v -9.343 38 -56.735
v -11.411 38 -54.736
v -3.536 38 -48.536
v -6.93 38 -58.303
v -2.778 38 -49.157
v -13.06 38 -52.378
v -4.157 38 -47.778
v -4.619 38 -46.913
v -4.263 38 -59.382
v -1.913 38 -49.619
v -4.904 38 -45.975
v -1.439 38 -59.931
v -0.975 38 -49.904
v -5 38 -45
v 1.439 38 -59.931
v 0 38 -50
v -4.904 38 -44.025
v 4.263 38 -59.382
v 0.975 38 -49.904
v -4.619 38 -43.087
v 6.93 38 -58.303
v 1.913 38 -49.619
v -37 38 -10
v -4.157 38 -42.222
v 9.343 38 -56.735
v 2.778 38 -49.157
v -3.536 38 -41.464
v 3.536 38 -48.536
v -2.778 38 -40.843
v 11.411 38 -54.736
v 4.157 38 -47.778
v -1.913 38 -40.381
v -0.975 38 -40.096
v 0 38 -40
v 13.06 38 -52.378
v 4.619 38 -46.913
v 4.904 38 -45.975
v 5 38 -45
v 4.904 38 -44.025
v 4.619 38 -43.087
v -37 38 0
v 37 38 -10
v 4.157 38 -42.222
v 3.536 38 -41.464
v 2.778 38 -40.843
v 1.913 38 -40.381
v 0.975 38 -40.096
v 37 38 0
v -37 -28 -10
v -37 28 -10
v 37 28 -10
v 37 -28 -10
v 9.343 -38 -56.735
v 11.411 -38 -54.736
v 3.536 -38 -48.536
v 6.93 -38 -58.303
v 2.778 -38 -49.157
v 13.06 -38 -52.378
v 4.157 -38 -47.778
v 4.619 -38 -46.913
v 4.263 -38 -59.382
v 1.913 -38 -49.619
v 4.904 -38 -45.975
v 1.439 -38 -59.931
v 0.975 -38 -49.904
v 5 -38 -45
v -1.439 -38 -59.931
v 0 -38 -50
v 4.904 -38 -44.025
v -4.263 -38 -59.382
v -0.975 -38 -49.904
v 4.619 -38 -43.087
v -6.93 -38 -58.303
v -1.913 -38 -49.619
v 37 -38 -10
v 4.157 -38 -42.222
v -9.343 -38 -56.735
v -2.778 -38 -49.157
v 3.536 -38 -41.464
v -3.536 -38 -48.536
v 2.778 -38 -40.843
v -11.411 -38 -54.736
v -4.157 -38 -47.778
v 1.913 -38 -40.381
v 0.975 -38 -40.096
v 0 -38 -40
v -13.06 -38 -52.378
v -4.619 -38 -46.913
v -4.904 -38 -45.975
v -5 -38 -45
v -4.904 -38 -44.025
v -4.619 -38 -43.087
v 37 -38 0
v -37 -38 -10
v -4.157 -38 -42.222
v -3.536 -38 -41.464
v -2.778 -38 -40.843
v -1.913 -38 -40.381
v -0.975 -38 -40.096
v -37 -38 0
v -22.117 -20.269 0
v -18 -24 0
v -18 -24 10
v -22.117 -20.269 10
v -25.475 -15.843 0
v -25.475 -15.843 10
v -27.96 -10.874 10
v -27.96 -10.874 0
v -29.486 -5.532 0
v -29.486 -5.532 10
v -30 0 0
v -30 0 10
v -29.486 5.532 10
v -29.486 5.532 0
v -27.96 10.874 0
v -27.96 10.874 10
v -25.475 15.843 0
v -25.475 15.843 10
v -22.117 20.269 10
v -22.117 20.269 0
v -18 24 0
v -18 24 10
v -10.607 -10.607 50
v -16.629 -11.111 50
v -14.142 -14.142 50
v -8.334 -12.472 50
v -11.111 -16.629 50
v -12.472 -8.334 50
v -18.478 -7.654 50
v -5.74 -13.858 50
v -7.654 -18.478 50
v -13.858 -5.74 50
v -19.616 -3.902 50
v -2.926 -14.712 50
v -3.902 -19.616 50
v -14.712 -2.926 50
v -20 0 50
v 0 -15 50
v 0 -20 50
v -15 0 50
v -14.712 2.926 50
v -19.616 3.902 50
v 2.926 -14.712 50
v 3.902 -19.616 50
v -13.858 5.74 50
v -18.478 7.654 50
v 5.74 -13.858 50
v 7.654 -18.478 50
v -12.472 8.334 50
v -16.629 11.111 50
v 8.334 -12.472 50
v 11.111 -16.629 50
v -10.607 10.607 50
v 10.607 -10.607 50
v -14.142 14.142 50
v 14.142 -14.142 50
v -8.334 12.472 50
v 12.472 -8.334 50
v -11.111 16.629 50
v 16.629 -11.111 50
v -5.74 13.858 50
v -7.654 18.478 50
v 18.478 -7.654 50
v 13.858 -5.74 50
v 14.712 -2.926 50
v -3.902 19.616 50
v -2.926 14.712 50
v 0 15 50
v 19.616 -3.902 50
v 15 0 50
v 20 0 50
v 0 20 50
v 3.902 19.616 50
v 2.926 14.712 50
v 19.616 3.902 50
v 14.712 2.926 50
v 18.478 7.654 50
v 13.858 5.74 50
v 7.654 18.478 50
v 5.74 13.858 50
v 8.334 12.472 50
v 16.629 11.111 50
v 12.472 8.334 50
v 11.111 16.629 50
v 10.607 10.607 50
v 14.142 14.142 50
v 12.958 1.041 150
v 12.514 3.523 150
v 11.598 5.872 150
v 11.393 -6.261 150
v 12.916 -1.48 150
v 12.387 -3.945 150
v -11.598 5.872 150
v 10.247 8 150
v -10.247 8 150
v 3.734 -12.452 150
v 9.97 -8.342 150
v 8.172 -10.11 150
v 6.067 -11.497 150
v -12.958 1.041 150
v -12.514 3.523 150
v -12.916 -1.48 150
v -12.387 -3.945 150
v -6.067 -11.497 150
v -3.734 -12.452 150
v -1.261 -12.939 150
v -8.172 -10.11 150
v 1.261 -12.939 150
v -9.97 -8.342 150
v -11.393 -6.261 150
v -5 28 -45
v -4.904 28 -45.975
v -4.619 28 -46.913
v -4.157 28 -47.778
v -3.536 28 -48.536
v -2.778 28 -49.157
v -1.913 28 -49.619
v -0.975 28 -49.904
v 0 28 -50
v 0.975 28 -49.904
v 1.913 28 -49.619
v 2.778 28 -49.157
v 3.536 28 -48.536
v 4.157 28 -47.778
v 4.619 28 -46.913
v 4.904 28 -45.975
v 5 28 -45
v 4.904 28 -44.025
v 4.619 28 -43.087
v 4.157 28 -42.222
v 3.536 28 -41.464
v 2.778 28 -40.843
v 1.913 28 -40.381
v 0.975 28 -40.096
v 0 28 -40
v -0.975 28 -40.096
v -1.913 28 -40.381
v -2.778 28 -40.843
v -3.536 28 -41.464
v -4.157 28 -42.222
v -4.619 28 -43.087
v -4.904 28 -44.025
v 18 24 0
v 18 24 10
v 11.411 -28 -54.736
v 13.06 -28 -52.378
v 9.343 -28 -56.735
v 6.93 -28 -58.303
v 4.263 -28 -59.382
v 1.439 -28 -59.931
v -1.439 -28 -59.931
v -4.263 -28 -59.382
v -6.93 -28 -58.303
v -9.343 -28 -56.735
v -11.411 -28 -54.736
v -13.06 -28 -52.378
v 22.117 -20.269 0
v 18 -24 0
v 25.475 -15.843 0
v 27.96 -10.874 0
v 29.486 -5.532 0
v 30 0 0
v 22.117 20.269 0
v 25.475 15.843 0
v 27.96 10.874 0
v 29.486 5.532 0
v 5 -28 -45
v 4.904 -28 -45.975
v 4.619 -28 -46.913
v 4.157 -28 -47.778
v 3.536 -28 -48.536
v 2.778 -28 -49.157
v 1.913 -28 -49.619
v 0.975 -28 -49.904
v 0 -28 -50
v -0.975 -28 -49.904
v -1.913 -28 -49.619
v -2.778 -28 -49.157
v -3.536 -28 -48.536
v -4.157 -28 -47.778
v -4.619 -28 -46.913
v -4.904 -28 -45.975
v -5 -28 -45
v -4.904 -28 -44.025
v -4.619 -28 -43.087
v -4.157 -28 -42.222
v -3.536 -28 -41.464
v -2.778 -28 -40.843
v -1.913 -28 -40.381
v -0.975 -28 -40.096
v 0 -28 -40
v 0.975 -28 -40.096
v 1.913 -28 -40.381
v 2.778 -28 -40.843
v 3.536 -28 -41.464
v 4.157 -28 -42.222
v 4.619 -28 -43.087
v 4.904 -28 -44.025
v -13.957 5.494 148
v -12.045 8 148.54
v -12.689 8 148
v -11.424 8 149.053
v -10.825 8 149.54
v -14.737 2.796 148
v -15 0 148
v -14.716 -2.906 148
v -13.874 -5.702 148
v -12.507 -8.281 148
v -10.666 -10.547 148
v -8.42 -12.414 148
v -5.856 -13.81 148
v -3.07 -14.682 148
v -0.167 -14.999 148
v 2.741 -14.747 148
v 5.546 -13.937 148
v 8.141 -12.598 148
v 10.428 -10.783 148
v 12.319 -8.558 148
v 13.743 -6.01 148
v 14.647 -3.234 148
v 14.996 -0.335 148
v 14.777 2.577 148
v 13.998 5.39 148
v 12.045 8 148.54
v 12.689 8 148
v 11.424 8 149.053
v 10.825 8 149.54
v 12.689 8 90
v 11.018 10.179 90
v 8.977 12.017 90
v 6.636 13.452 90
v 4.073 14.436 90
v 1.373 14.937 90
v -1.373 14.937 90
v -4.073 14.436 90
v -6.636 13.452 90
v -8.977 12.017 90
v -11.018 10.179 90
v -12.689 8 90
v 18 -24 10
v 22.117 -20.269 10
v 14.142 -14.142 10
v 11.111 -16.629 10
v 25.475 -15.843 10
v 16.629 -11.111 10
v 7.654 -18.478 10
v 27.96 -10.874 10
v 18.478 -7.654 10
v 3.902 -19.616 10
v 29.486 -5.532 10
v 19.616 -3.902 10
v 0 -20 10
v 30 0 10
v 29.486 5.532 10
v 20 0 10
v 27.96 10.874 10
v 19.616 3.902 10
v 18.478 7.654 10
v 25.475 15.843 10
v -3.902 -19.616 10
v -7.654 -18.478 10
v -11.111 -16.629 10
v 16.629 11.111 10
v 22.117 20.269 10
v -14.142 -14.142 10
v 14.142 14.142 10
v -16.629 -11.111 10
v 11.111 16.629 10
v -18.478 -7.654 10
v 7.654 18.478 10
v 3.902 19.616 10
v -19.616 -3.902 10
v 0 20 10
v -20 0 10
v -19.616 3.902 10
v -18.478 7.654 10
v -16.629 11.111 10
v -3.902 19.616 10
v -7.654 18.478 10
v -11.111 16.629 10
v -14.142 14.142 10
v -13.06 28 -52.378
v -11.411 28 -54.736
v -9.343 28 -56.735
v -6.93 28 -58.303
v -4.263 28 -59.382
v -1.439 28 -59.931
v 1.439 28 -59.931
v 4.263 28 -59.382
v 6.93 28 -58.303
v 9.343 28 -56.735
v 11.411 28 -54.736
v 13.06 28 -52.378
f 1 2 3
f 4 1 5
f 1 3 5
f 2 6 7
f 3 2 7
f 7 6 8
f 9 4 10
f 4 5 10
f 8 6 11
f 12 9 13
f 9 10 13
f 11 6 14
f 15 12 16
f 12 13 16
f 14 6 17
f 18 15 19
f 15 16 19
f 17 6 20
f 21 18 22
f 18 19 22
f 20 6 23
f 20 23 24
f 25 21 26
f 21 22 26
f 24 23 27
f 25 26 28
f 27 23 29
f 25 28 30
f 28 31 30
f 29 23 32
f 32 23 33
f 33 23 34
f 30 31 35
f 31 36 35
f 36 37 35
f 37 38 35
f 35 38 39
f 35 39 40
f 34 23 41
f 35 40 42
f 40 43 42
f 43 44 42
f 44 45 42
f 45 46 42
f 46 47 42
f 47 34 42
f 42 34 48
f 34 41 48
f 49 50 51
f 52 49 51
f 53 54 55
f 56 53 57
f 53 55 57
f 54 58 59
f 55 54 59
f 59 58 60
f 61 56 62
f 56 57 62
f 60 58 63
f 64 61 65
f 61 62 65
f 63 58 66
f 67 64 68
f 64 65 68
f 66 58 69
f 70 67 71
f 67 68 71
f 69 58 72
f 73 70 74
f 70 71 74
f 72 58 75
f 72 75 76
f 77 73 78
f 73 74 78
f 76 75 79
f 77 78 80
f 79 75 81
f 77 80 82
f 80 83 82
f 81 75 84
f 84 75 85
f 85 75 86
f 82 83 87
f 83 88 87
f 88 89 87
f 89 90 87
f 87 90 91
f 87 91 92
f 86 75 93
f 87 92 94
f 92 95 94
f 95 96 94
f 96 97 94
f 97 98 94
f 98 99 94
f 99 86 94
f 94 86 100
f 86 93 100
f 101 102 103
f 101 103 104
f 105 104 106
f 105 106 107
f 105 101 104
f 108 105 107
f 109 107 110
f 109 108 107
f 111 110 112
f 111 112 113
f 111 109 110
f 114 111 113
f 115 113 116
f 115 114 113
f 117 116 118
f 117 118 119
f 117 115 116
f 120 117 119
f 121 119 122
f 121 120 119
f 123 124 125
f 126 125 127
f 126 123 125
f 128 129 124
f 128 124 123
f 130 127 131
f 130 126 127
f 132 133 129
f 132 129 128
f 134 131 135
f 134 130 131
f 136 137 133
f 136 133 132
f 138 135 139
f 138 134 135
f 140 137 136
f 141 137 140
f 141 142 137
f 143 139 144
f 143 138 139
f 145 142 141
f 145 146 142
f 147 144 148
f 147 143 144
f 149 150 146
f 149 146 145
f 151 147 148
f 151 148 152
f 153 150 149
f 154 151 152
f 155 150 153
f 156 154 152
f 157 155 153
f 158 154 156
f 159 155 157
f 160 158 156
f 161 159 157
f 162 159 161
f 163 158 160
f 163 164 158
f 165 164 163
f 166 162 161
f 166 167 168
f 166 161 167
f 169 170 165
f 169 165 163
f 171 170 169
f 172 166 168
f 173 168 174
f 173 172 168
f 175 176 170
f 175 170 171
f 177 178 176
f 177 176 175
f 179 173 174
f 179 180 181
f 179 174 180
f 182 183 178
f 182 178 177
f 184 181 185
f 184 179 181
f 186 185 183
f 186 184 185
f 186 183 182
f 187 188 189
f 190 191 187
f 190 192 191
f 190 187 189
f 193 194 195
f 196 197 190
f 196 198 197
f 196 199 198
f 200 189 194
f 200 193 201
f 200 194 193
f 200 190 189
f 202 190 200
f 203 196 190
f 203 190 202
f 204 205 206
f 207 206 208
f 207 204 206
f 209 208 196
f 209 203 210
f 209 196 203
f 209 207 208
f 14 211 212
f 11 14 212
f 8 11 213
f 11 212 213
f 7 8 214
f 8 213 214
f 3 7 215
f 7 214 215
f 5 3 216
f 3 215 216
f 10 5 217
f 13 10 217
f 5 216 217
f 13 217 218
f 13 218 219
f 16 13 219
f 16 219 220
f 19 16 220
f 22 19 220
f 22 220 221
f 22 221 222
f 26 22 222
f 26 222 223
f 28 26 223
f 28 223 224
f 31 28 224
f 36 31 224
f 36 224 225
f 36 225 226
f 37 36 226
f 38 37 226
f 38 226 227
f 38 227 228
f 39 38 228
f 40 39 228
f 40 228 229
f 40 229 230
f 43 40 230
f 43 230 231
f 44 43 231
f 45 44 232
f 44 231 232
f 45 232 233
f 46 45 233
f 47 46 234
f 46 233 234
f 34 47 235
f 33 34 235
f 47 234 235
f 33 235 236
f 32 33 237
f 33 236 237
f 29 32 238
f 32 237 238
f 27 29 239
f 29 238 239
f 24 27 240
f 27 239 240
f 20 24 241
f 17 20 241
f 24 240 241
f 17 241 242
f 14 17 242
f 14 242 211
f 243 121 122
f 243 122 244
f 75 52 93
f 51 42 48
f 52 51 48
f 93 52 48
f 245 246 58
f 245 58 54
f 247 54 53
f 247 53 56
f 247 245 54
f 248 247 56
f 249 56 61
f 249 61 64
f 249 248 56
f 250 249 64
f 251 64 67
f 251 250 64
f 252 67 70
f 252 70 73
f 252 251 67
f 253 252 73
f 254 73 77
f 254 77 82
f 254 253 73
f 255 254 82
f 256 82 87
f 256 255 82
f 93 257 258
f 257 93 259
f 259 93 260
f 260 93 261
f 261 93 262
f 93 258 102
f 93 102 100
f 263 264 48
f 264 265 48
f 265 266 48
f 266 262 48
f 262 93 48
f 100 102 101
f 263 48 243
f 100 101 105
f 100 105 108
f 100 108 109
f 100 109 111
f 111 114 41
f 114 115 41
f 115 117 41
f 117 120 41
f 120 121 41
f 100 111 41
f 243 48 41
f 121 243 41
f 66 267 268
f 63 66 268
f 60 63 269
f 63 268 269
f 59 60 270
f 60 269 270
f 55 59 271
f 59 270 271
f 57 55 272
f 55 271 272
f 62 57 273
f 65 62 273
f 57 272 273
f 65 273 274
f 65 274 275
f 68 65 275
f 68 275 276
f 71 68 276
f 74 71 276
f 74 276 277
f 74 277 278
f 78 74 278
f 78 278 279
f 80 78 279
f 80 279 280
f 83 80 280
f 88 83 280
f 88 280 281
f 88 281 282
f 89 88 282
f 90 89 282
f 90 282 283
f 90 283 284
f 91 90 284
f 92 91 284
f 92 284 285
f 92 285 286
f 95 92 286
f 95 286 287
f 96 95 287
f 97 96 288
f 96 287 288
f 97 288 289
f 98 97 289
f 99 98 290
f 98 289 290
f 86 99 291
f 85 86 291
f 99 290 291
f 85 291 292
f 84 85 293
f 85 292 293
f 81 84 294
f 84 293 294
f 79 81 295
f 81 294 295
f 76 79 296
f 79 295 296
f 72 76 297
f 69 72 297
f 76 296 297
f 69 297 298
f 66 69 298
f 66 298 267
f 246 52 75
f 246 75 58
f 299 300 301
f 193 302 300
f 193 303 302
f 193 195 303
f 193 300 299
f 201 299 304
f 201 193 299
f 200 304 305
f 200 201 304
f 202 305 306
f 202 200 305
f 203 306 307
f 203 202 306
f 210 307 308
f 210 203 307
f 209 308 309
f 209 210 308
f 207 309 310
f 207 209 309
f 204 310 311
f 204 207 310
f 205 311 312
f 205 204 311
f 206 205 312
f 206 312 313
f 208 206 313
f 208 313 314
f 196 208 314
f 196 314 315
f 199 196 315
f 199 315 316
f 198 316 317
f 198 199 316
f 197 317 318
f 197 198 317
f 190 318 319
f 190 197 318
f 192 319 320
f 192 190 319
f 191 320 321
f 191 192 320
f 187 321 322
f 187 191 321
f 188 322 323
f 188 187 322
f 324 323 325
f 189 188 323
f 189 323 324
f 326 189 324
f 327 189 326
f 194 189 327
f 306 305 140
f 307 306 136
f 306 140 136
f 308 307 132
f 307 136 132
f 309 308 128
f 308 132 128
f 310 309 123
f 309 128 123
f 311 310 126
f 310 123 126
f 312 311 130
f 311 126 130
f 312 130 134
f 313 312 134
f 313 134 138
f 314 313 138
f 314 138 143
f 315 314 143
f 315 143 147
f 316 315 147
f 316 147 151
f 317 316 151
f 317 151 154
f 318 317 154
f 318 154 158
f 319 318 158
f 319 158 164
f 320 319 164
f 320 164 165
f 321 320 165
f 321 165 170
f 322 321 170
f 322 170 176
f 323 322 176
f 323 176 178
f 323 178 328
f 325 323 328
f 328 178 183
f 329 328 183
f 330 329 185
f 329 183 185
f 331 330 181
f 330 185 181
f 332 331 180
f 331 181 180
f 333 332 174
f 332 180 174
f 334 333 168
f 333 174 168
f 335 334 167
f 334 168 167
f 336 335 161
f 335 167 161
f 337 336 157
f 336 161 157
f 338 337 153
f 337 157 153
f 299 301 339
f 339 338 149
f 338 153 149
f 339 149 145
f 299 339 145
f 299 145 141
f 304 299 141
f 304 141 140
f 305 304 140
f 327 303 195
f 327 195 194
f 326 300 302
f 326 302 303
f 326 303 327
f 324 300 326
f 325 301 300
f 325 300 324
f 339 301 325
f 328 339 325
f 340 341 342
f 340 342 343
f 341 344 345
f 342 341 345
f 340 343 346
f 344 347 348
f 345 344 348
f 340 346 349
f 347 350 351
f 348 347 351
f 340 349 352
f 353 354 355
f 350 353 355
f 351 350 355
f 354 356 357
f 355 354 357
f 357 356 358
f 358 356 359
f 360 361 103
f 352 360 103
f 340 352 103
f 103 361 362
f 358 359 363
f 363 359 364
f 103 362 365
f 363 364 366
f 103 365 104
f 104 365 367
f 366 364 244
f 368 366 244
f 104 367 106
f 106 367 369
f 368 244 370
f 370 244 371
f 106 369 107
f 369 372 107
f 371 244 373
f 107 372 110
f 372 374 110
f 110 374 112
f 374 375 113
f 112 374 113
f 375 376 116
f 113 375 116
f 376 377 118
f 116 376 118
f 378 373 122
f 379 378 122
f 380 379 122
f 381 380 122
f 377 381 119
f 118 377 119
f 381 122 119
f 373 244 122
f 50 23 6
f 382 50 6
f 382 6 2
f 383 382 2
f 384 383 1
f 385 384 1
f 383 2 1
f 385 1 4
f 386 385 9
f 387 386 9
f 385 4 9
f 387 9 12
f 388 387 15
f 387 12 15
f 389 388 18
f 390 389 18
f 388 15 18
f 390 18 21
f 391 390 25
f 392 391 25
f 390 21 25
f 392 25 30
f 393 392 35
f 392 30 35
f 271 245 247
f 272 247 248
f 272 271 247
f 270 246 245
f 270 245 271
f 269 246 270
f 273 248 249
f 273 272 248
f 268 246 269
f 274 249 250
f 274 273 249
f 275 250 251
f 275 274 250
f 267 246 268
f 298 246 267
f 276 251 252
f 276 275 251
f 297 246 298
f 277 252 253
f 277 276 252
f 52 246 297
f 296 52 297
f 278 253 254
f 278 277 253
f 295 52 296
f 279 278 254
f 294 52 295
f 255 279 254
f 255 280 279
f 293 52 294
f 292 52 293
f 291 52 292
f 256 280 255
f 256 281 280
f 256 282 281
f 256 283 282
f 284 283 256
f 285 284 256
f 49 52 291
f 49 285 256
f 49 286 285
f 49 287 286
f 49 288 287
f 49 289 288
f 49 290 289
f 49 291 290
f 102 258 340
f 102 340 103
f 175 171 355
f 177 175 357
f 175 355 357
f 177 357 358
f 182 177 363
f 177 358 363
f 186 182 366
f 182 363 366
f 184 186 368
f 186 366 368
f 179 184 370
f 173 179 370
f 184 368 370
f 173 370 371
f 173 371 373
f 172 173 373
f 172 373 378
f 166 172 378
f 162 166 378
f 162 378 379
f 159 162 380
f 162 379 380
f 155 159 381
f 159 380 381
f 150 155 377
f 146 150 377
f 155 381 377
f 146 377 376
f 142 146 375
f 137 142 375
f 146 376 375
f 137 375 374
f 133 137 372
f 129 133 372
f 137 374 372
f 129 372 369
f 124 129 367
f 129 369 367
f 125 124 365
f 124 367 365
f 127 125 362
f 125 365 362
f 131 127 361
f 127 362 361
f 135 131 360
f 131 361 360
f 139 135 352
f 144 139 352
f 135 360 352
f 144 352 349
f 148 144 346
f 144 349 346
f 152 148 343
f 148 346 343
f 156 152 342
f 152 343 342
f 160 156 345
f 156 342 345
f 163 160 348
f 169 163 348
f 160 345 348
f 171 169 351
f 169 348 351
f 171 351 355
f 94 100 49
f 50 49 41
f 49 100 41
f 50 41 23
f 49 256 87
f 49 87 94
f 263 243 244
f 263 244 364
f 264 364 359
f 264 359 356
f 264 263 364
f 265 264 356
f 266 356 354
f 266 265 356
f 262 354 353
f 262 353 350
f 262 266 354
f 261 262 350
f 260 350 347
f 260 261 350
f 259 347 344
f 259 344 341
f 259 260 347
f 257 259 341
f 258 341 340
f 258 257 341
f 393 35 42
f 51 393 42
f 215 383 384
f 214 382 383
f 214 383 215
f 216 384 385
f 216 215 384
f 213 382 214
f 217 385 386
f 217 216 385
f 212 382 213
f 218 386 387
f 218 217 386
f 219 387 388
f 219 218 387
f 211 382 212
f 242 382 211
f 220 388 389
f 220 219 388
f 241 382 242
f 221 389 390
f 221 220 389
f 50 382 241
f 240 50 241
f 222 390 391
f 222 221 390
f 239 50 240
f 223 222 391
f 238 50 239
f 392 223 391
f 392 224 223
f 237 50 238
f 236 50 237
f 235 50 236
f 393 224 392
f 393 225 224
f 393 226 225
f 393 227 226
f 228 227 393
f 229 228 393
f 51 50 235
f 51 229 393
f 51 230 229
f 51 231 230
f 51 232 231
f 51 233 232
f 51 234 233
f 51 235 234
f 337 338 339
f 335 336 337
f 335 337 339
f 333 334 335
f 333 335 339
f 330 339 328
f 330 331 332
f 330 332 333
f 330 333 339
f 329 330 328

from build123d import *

# Parameters (mm, degrees)
SKETCH1_W                      = 74
SKETCH1_H                      = 56
BOSS_EXTRUDE1_DEPTH            = 10
BOSS_EXTRUDE2_DEPTH            = 10
BOSS_EXTRUDE3_START            = 10
BOSS_EXTRUDE3_DEPTH            = 10
BOSS_EXTRUDE4_DEPTH            = 10
SKETCH5_R                      = 20
BOSS_EXTRUDE5_DEPTH            = 40
SKETCH6_R                      = 15
BOSS_EXTRUDE6_DEPTH            = 100
CUT_EXTRUDE1_START             = -60
CUT_EXTRUDE1_DEPTH             = 60
F_10_0_10_DIAMETER_HOLE1_D     = 10
F_10_0_10_DIAMETER_HOLE1_DEPTH = 10
F_10_0_10_DIAMETER_HOLE2_D     = 10
F_10_0_10_DIAMETER_HOLE2_DEPTH = 76
CHAMFER1_SIZE                  = 2


with BuildPart() as part:
    # Sketch1 → Boss-Extrude1 (new body)
    with BuildSketch(Plane.XY):
        Rectangle(SKETCH1_W, SKETCH1_H)
    extrude(amount=-BOSS_EXTRUDE1_DEPTH)

    # Sketch2 → Boss-Extrude2 (add)
    with BuildSketch(Plane.XZ.offset(28)):
        with BuildLine():
            Line((-37, 0), (37, 0))
            Line((37, 0), (37, -10))
            Line((37, -10), (13.060137394, -52.377859531))
            ThreePointArc((13.060137394, -52.377859531), (0, -60), (-13.060137394, -52.377859531))
            Line((-13.060137394, -52.377859531), (-37, -10))
            Line((-37, -10), (-37, 0))
        make_face()
    extrude(amount=BOSS_EXTRUDE2_DEPTH)

    # Sketch3 → Boss-Extrude3 (add)
    with BuildSketch(Plane(origin=(0, 28, 0), x_dir=(-1, 0, 0), z_dir=(0, 1, 0)).offset(BOSS_EXTRUDE3_START)):
        with BuildLine():
            Line((-37, 0), (37, 0))
            Line((37, 0), (37, -10))
            Line((37, -10), (13.060137394, -52.377859531))
            ThreePointArc((13.060137394, -52.377859531), (0, -60), (-13.060137394, -52.377859531))
            Line((-13.060137394, -52.377859531), (-37, -10))
            Line((-37, -10), (-37, 0))
        make_face()
    extrude(amount=-BOSS_EXTRUDE3_DEPTH)

    # Sketch4 → Boss-Extrude4 (add)
    with BuildSketch(Plane.XY):
        with BuildLine():
            Line((18, -24), (-18, -24))
            ThreePointArc((-18, -24), (-30, 0), (-18, 24))
            Line((-18, 24), (18, 24))
            ThreePointArc((18, 24), (30, 0), (18, -24))
        make_face()
    extrude(amount=BOSS_EXTRUDE4_DEPTH)

    # Sketch5 → Boss-Extrude5 (add)
    with BuildSketch(Plane.XY.offset(10)):
        Circle(SKETCH5_R)
    extrude(amount=BOSS_EXTRUDE5_DEPTH)

    # Sketch6 → Boss-Extrude6 (add)
    with BuildSketch(Plane.XY.offset(50)):
        with Locations(Location((0, 0, 0), (0, 0, 180))):
            Circle(SKETCH6_R)
    extrude(amount=BOSS_EXTRUDE6_DEPTH)

    # Sketch7 → Cut-Extrude1 (cut)
    with BuildSketch(Plane.XY.offset(150).offset(CUT_EXTRUDE1_START)):
        with BuildLine():
            Line((-12.68857754, 8), (12.68857754, 8))
            ThreePointArc((12.68857754, 8), (0, 15), (-12.68857754, 8))
        make_face()
    extrude(amount=CUT_EXTRUDE1_DEPTH, mode=Mode.SUBTRACT)

    # Ø10.0 (10) Diameter Hole1
    with Locations(Plane(origin=(0, -38, 0), x_dir=(-1, 0, 0), z_dir=(0, -1, 0))):
        with Locations((0, 45)):
            Hole(F_10_0_10_DIAMETER_HOLE1_D / 2, depth=F_10_0_10_DIAMETER_HOLE1_DEPTH)

    # Ø10.0 (10) Diameter Hole2
    with Locations(Plane(origin=(0, 38, 0), x_dir=(1, 0, 0), z_dir=(0, 1, 0))):
        with Locations((0, 45)):
            Hole(F_10_0_10_DIAMETER_HOLE2_D / 2, depth=F_10_0_10_DIAMETER_HOLE2_DEPTH)

    # Chamfer1
    chamfer1_edges = [part.edges().sort_by_distance(p)[0] for p in [
        (4.163612428, -14.410563193, 150),
    ]]
    chamfer(chamfer1_edges, length=CHAMFER1_SIZE)


solid = part.part
